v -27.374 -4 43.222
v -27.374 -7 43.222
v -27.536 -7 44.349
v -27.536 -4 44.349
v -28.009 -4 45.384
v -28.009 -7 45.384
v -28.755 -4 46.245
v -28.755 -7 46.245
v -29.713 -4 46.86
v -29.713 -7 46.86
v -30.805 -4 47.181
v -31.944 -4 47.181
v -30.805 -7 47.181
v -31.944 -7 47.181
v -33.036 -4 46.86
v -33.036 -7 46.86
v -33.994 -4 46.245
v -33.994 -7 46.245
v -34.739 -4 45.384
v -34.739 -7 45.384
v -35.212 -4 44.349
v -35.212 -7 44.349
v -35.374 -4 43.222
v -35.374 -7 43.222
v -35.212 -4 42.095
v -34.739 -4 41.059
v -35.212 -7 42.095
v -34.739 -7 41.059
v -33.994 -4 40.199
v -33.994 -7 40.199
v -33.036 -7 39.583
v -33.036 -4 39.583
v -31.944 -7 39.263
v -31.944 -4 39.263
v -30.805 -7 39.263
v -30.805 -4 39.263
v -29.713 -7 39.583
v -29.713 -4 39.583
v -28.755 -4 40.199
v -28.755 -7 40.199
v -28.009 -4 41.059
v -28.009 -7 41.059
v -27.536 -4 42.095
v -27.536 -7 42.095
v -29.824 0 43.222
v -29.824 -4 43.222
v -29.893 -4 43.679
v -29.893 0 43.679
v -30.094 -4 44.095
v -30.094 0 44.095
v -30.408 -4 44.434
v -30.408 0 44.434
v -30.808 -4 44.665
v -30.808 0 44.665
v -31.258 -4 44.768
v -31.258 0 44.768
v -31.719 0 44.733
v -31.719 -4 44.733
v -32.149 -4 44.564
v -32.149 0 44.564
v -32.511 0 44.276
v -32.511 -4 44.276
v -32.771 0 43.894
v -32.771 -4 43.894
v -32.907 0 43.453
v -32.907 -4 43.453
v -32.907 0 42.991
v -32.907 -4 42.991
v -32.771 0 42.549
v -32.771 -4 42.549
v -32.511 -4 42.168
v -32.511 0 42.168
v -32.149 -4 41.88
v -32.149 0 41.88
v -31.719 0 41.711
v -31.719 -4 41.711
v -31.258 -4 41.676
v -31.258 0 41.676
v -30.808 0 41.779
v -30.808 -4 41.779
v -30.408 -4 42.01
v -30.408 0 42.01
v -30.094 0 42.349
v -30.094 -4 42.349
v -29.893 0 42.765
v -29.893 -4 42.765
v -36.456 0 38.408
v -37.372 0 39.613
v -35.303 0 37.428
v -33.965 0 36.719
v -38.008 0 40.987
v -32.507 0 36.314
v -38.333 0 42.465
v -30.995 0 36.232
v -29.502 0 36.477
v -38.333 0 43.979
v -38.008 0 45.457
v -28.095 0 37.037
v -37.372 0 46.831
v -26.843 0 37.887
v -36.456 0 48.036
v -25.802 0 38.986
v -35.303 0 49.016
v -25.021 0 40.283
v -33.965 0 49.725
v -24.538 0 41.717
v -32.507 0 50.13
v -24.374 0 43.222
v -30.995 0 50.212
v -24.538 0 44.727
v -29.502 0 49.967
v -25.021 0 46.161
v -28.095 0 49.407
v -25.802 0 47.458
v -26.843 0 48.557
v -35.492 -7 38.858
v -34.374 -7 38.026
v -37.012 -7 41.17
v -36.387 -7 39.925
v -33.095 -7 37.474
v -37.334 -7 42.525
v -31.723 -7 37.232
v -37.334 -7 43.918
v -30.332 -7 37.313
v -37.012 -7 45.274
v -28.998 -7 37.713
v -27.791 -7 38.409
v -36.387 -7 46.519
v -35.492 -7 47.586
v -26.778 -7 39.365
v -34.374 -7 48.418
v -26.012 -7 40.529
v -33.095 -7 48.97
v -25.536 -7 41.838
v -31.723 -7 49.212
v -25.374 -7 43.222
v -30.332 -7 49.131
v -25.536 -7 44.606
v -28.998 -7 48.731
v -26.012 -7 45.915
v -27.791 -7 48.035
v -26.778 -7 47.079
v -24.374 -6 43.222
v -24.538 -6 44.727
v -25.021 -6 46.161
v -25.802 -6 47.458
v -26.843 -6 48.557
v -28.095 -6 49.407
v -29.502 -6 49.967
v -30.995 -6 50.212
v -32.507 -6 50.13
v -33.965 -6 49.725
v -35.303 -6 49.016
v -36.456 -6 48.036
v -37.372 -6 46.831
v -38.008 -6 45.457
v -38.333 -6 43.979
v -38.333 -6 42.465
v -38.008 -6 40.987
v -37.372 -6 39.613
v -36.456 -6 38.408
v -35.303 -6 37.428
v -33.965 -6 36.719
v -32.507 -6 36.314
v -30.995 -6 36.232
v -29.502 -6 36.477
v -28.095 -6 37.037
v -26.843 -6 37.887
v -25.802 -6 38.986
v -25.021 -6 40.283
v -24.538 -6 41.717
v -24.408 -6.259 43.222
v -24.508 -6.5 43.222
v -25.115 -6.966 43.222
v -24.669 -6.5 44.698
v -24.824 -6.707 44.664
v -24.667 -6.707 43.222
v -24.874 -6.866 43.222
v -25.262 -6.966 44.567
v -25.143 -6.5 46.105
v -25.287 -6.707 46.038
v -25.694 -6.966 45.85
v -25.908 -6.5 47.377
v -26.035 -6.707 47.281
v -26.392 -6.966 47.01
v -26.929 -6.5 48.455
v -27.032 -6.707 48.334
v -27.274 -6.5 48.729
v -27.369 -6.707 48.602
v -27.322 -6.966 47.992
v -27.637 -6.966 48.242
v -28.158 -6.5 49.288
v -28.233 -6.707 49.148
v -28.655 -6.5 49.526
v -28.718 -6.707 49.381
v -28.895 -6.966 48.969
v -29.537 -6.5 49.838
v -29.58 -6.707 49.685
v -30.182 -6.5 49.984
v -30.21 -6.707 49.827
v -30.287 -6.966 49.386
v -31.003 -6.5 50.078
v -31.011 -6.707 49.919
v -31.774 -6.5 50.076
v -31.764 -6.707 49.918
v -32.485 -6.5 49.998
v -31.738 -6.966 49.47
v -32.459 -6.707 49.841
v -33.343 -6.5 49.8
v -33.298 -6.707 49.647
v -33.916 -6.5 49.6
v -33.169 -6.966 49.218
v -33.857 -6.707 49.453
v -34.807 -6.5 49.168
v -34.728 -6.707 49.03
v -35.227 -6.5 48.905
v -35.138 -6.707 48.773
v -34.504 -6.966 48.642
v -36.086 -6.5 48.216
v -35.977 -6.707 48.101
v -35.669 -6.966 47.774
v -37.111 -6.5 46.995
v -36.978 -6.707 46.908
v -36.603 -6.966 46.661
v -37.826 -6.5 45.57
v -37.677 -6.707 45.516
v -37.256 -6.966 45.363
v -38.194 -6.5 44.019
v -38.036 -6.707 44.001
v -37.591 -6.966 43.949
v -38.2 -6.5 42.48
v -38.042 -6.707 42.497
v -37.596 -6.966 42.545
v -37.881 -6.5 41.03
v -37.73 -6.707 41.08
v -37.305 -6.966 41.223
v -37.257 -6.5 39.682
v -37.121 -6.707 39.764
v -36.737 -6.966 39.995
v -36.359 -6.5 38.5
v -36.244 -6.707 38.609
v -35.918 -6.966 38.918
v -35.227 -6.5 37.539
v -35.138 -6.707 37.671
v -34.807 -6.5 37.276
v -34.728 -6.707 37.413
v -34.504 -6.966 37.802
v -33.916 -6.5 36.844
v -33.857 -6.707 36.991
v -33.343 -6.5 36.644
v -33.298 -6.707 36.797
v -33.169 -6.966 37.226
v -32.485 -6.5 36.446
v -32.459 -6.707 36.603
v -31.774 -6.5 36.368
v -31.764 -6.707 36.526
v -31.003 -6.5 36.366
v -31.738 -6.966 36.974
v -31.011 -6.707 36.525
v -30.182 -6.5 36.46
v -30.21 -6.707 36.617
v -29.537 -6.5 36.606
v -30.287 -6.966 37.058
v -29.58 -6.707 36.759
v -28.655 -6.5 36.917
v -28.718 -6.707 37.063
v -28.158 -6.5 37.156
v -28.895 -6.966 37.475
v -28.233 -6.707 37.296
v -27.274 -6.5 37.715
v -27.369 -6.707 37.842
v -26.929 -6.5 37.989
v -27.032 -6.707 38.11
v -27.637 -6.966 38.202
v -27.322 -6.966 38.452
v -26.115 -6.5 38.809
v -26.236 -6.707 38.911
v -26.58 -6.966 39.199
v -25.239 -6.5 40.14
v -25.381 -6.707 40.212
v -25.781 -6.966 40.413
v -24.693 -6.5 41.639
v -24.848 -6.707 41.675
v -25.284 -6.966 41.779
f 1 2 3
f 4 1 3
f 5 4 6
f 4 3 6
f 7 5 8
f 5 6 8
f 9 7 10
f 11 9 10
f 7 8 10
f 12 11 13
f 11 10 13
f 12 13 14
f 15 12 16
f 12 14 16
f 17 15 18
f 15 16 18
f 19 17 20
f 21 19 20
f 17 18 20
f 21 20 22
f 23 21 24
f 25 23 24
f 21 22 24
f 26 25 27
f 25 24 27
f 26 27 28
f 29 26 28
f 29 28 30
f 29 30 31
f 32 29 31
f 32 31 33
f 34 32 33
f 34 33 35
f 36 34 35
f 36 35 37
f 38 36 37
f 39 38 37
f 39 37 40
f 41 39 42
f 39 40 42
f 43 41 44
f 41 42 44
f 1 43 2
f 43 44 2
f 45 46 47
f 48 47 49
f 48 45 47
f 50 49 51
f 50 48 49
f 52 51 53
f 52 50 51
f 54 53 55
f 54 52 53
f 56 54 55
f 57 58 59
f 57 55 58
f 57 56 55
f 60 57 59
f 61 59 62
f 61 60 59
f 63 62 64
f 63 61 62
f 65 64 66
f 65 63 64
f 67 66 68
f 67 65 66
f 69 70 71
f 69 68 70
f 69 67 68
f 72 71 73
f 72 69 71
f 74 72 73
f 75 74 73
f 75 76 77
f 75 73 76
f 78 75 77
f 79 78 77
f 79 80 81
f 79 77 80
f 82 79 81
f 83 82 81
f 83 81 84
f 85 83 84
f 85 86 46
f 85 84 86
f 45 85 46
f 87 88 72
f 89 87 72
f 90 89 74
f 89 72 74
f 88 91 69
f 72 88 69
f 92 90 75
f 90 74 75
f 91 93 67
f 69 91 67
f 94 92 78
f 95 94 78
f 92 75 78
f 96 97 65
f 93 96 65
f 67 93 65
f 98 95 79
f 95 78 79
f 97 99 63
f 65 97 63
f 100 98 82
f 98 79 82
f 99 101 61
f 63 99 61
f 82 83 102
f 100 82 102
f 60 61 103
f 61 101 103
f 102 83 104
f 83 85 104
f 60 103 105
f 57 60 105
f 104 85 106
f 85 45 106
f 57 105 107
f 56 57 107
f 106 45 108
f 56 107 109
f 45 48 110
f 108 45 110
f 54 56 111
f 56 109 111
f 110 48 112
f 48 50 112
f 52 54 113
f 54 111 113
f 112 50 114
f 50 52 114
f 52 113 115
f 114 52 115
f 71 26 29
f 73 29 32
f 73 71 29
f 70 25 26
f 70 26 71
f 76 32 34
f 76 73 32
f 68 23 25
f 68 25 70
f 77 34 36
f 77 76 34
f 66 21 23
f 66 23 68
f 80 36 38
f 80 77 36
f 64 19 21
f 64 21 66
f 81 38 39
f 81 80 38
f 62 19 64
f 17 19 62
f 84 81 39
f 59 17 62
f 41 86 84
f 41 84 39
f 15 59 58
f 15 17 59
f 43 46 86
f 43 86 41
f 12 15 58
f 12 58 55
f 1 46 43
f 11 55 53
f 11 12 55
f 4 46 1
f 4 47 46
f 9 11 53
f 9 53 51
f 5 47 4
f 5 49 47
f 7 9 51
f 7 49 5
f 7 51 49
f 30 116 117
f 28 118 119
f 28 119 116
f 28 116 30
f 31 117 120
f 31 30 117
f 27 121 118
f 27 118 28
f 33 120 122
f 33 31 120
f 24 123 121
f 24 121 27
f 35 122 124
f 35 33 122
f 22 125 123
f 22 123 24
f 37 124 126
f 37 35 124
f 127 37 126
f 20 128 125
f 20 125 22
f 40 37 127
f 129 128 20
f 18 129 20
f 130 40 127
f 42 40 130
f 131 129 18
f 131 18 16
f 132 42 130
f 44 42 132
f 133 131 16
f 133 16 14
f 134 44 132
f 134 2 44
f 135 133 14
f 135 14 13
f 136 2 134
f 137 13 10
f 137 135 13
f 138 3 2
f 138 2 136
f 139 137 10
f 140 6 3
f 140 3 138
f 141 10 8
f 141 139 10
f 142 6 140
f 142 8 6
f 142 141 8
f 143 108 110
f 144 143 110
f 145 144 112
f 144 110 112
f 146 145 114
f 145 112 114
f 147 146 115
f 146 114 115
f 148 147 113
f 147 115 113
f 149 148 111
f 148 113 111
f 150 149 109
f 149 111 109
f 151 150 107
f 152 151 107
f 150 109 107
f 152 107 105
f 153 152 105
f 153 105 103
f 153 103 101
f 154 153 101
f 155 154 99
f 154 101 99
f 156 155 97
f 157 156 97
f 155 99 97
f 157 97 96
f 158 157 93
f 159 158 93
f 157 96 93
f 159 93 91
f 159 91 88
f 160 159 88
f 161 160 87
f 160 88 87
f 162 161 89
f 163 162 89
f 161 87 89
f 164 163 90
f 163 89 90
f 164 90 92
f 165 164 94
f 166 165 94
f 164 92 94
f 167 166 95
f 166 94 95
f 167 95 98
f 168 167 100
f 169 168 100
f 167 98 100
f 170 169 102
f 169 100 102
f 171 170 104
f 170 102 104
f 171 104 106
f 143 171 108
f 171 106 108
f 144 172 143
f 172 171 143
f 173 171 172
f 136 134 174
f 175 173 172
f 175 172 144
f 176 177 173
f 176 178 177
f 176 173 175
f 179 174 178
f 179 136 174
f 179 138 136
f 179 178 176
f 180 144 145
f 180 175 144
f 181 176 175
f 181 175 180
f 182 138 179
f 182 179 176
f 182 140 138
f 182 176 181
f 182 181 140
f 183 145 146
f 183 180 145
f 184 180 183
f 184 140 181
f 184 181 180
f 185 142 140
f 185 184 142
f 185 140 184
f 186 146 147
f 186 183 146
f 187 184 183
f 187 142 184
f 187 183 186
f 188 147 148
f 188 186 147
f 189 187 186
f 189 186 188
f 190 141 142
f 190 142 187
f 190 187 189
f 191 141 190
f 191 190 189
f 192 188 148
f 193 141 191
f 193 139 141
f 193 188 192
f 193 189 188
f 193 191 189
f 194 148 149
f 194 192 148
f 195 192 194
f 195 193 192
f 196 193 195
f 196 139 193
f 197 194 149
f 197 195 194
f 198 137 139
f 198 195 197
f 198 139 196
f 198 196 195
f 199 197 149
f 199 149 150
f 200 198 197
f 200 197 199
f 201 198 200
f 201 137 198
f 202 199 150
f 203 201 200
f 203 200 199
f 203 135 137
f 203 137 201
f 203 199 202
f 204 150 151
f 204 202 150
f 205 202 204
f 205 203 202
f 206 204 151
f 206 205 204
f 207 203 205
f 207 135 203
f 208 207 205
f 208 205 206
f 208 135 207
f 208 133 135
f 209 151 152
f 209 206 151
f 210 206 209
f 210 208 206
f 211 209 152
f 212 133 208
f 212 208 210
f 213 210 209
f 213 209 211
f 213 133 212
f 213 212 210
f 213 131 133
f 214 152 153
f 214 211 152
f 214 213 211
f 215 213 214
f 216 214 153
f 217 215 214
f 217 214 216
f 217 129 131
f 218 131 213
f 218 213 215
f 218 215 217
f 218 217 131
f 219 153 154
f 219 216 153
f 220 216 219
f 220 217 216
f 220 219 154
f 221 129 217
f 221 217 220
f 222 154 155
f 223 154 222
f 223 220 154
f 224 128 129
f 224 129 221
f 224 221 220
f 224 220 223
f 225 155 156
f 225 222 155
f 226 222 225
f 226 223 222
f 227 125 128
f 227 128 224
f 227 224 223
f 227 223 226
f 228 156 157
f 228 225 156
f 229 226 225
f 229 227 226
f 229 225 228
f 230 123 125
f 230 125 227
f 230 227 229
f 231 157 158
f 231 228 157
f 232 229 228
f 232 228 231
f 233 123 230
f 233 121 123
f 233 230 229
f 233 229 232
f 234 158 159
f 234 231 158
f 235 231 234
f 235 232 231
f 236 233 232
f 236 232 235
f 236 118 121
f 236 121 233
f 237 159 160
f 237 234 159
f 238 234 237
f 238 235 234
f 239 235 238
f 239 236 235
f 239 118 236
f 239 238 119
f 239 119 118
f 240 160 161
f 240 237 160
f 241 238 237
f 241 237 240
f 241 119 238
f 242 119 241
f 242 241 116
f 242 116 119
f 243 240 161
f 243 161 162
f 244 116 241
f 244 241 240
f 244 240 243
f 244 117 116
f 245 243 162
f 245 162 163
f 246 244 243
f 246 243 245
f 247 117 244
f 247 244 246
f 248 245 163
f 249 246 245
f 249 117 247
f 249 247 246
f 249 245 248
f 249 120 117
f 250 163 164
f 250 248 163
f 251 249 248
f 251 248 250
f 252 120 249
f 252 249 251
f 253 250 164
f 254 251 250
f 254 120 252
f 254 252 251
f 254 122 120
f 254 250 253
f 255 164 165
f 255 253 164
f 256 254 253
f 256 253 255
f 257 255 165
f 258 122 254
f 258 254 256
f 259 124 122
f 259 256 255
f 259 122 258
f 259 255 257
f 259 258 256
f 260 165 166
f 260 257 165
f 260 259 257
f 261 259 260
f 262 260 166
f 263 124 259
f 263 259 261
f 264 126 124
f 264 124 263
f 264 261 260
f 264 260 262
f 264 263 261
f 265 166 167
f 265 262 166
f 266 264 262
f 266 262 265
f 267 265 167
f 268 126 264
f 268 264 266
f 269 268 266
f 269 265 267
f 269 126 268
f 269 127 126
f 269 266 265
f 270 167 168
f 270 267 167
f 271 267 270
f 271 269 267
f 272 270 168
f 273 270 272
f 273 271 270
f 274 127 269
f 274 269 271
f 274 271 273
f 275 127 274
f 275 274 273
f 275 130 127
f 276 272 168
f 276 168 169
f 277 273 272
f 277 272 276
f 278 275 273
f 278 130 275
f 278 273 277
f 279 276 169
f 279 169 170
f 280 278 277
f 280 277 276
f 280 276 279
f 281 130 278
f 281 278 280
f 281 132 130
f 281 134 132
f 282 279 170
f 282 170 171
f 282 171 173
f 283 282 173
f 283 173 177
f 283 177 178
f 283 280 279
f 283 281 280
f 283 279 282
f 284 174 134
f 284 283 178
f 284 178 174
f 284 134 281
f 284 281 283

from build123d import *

# Parameters (mm, degrees)
F0_R     = 7
F0_R_2   = 1.55
F1_DEPTH = 7
F2_R     = 1
F3_R     = 4
F4_DEPTH = 3


with BuildPart() as f1:
    # F0 (on Front) → F1 (new body)
    with BuildSketch(Plane.XZ):
        with Locations((-31.374283, 43.221928)):
            Circle(F0_R)
        with Locations((-31.374283, 43.221928)):
            Circle(F0_R_2, mode=Mode.SUBTRACT)
    extrude(amount=F1_DEPTH)

    # F2
    f2_edges = [f1.edges().sort_by_distance(p)[0] for p in [
        (-38.374283, -7, 43.221928),
    ]]
    fillet(f2_edges, radius=F2_R)

    # F3 (on face) → F4 (cut)
    with BuildSketch(Plane.XZ.offset(7)):
        with Locations((-31.374283, 43.221928)):
            Circle(F3_R)
    extrude(amount=-F4_DEPTH, mode=Mode.SUBTRACT)


solid = f1.part
